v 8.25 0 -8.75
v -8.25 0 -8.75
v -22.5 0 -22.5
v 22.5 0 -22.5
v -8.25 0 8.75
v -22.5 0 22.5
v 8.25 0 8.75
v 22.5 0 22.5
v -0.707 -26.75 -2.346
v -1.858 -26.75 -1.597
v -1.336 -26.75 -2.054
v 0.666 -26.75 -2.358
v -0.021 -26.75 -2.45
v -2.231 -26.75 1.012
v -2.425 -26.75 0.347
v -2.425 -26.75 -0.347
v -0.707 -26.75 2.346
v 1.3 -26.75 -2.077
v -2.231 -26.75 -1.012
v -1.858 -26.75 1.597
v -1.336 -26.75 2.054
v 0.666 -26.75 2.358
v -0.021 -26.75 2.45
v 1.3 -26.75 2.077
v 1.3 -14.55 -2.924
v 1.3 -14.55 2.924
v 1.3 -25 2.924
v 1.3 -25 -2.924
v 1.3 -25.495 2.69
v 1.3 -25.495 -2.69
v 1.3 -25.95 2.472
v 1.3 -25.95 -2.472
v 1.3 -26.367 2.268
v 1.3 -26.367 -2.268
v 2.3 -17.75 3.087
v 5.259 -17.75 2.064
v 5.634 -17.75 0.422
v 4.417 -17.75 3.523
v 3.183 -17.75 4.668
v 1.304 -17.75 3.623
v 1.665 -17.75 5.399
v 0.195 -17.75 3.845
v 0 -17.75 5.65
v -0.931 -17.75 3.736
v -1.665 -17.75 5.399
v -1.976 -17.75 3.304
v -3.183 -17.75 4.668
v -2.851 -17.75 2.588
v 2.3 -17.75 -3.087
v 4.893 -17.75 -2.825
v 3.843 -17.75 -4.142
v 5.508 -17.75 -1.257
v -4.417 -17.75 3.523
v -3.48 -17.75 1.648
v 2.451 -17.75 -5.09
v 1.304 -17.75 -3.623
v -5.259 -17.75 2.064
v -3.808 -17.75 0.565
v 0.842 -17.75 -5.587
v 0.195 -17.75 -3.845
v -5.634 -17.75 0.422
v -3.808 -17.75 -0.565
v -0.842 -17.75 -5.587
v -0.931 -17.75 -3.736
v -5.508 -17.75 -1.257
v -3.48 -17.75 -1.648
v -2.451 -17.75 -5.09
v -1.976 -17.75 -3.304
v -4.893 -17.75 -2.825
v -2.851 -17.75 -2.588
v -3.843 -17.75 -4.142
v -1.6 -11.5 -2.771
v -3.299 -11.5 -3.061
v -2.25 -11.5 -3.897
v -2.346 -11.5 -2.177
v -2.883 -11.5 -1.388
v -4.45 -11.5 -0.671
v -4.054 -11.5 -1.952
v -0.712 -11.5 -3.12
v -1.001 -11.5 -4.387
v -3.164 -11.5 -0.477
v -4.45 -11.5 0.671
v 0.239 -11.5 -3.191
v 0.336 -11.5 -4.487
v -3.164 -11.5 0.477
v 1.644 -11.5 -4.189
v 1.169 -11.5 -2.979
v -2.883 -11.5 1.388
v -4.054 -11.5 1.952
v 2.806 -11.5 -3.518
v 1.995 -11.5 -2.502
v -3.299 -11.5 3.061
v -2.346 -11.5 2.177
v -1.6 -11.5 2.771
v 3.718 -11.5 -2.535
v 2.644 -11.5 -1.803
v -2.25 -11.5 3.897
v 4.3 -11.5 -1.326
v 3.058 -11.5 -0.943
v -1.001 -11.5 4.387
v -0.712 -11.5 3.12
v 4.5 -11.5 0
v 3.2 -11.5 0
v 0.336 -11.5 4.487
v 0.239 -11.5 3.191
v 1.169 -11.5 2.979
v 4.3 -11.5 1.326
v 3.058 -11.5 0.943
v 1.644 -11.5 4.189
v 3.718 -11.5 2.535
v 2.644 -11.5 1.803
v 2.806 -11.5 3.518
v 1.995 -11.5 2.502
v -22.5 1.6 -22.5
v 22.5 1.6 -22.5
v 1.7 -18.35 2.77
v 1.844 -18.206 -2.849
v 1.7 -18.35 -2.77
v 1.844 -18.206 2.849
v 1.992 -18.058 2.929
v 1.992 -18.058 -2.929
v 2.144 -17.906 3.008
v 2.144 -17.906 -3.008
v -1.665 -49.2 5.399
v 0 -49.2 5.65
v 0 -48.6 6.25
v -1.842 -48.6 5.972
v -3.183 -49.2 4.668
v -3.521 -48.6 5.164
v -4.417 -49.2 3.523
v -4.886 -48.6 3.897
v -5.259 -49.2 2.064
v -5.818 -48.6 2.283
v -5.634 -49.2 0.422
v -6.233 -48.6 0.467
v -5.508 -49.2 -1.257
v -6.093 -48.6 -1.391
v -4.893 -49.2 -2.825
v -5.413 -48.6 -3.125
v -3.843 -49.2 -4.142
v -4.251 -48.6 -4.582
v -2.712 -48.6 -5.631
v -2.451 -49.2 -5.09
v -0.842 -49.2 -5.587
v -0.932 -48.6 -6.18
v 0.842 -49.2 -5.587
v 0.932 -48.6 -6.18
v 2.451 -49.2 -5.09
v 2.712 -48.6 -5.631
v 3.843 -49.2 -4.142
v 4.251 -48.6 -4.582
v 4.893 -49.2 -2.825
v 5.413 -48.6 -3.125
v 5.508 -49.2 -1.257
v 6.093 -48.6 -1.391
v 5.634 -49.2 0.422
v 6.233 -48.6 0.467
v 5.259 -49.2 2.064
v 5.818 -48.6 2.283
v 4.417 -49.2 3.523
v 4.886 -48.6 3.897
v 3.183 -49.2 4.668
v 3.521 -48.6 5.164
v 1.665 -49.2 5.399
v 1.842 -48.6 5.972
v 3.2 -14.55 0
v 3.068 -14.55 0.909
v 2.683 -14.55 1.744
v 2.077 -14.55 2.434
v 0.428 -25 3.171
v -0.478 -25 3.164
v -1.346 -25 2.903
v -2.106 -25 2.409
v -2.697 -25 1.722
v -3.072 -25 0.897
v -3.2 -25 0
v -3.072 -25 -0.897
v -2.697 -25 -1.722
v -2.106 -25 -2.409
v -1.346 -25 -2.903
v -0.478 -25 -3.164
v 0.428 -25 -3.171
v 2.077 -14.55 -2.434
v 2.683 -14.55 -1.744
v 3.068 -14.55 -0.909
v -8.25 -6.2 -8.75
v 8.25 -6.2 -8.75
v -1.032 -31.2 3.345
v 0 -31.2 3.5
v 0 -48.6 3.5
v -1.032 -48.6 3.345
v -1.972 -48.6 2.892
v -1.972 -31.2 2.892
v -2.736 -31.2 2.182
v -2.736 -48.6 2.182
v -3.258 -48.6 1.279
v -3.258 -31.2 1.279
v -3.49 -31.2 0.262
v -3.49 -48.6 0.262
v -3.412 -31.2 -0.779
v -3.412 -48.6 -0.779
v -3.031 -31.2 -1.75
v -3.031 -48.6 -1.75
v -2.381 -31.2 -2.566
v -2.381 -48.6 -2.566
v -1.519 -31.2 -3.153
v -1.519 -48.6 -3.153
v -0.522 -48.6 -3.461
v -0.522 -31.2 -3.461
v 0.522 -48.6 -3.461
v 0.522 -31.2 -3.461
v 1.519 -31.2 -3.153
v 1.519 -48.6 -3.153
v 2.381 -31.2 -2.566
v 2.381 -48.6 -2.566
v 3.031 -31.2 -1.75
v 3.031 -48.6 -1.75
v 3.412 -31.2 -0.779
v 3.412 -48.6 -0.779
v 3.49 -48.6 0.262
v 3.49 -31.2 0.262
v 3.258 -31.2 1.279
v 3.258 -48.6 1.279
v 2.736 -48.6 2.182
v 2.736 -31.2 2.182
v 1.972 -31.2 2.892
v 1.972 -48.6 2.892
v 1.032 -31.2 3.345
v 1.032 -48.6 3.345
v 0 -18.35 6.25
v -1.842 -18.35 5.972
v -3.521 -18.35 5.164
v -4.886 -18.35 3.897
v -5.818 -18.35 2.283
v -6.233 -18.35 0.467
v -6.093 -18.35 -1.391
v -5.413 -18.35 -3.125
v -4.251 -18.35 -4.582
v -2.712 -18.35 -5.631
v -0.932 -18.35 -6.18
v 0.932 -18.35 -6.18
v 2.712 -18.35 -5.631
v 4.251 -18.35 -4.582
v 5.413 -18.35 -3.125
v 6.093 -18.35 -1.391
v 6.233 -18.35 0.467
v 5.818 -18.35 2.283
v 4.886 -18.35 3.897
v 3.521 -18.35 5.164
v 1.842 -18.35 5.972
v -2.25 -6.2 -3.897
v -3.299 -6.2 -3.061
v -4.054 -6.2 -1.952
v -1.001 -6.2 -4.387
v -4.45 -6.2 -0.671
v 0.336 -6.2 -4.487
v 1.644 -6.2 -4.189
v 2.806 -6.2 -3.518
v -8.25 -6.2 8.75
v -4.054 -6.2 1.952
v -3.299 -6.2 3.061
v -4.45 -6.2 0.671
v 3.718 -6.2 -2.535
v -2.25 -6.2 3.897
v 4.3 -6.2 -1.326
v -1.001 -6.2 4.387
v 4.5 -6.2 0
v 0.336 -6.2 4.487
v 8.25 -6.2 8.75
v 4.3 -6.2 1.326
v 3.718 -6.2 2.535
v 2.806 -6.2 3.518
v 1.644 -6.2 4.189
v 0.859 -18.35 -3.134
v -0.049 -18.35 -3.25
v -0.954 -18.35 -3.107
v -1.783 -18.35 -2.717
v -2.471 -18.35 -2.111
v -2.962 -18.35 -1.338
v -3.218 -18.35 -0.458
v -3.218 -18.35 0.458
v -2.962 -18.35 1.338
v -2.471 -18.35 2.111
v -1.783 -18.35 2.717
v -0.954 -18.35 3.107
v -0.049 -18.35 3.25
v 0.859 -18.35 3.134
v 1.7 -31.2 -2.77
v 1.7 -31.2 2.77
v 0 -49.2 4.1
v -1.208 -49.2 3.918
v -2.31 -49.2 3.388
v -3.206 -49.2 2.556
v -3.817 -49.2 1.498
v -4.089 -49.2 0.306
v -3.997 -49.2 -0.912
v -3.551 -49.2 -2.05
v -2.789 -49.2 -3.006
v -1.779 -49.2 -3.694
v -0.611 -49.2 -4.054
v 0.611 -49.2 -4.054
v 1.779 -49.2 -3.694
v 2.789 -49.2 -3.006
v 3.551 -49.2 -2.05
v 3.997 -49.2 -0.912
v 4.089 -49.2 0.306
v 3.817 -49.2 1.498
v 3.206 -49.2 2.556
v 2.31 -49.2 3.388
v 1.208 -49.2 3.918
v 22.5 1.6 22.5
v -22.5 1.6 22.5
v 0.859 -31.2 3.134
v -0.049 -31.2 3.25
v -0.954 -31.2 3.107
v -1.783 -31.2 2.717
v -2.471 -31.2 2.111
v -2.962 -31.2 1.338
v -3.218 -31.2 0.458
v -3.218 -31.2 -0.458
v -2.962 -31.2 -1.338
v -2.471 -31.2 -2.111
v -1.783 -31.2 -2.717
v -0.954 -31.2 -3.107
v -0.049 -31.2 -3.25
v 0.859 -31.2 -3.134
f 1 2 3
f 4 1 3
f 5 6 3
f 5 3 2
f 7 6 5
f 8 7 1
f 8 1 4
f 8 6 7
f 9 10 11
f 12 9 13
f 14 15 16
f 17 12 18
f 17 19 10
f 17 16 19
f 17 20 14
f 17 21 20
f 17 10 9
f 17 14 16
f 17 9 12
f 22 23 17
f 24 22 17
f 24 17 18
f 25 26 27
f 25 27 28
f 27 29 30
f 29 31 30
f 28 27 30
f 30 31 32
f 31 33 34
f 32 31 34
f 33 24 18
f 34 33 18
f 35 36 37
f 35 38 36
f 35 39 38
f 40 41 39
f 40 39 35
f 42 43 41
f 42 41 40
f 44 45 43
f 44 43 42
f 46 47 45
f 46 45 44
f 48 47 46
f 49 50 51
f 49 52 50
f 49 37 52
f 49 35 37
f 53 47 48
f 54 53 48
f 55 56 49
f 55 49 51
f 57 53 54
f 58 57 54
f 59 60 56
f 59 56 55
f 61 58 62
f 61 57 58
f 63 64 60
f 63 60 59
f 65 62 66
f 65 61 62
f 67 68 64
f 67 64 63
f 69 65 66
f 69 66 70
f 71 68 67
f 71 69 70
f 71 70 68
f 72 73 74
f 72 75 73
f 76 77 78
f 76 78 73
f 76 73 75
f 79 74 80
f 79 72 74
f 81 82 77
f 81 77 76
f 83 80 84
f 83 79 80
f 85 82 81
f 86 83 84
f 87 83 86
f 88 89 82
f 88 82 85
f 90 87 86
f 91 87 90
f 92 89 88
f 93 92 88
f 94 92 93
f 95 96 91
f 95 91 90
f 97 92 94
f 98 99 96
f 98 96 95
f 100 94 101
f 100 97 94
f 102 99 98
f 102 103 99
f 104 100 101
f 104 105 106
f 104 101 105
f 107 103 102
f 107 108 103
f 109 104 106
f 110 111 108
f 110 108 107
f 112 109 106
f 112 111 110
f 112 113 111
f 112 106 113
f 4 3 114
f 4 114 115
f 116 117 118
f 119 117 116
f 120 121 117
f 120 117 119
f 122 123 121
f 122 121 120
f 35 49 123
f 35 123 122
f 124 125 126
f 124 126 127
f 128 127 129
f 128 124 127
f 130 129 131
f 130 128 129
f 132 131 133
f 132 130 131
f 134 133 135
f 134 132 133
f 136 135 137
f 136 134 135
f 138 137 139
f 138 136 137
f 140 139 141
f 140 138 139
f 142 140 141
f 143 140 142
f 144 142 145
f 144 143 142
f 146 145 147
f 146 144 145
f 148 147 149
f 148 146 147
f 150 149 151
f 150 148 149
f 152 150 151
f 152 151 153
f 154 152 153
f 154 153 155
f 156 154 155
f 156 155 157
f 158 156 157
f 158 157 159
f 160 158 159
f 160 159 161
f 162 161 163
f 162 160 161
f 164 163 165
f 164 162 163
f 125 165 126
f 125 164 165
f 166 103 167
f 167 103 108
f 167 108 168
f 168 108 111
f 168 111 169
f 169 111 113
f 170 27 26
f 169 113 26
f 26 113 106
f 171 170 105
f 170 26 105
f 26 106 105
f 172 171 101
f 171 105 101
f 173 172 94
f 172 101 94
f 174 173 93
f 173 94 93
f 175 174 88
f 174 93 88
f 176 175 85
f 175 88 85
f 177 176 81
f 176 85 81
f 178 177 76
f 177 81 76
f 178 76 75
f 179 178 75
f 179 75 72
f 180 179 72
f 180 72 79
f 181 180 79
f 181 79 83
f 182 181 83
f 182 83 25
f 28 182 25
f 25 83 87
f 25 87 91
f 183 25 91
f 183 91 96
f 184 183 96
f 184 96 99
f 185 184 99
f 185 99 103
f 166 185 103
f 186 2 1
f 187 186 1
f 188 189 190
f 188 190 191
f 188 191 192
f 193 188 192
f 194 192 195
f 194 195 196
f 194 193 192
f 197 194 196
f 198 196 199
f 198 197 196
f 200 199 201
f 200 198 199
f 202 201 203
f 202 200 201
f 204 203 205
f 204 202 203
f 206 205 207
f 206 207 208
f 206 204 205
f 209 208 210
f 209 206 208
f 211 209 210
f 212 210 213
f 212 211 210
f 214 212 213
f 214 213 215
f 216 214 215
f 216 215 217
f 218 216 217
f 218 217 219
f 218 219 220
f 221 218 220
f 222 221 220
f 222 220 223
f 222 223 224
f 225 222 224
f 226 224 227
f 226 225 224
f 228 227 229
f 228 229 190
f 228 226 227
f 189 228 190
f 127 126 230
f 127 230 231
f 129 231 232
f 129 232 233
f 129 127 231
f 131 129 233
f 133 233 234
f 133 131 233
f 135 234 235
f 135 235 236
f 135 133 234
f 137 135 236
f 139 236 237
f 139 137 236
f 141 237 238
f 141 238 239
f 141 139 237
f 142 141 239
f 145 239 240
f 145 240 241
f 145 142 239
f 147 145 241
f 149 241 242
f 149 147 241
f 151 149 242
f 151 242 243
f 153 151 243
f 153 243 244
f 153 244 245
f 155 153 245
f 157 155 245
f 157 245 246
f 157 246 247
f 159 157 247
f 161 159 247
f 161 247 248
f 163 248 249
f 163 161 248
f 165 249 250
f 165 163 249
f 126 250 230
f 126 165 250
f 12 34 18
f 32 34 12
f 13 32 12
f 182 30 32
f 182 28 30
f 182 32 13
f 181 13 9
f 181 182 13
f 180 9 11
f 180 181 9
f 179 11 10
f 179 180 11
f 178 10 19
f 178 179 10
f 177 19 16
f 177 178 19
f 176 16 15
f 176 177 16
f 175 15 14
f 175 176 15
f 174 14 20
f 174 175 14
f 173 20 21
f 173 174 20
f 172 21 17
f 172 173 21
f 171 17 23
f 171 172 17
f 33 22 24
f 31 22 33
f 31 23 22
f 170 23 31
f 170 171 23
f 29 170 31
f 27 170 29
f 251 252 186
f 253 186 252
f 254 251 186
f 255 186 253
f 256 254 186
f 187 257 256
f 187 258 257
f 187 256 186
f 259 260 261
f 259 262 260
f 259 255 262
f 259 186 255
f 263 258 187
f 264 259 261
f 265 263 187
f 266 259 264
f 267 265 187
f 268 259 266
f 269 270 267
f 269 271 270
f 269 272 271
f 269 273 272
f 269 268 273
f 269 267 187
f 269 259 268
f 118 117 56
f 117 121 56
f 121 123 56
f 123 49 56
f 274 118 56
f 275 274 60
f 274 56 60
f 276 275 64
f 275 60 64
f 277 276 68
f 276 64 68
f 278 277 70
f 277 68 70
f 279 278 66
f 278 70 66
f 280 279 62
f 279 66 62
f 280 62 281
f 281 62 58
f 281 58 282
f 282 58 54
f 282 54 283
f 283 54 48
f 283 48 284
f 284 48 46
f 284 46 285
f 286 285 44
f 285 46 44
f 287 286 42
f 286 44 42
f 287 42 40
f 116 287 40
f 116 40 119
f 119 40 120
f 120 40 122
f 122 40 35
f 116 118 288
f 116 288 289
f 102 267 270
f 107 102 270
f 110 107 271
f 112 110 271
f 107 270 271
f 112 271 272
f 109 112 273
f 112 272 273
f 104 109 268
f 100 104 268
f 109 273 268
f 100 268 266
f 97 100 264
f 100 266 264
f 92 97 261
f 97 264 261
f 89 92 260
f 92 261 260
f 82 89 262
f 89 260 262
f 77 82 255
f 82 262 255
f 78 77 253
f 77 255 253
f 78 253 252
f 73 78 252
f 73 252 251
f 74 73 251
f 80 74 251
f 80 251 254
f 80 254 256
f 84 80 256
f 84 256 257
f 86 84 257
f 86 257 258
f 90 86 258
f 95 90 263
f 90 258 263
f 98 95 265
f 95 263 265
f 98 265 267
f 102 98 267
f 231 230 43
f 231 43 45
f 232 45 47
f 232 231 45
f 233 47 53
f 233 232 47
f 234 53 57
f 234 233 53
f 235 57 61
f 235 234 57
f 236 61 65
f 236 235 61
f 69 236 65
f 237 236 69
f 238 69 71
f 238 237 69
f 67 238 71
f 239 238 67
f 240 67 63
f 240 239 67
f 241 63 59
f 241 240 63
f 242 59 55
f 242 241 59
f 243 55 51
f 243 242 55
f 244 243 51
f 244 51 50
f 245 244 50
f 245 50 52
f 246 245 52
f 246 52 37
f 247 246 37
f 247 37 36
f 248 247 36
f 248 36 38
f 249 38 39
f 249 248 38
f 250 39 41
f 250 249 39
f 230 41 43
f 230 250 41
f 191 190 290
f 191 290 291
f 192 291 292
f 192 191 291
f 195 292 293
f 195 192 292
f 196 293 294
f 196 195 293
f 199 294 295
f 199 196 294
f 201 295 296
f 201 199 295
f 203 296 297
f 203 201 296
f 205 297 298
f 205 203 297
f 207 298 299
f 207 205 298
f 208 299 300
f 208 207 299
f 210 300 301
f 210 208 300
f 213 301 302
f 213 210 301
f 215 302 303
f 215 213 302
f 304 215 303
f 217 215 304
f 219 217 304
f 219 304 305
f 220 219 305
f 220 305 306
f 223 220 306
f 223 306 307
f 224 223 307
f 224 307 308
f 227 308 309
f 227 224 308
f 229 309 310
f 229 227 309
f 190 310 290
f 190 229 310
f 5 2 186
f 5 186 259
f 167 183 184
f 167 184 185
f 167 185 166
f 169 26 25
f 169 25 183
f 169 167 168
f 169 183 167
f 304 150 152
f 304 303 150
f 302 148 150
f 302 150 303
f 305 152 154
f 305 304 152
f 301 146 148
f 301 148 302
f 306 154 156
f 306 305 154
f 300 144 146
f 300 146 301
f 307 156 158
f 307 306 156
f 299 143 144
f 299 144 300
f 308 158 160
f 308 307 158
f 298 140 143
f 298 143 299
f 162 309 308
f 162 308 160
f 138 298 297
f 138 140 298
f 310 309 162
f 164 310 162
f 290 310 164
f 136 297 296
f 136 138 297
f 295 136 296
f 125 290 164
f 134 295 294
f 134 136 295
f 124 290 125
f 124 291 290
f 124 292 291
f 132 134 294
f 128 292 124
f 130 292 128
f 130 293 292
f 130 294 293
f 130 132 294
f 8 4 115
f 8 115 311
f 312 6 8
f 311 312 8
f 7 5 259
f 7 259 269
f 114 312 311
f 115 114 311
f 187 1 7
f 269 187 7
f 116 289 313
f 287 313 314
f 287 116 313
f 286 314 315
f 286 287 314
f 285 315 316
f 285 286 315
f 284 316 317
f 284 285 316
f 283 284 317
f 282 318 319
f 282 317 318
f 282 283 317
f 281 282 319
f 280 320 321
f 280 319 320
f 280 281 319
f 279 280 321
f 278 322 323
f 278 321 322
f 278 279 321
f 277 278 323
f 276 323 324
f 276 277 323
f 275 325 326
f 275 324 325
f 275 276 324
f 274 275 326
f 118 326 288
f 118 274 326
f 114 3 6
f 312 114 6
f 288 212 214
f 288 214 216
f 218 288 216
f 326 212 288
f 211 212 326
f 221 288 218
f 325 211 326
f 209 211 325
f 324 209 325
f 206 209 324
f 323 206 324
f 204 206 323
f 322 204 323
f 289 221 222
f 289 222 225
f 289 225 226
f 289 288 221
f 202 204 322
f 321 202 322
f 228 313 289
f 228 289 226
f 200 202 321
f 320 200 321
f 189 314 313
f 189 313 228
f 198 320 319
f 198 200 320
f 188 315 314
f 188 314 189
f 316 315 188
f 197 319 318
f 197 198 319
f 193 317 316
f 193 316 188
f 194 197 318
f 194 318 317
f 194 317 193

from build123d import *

# Parameters (mm, degrees)
F0_W      = 45
F0_H      = 45
F1_DEPTH  = 1.6
F2_W      = 16.5
F2_H      = 17.5
F3_DEPTH  = 6.2
F4_R      = 4.5
F5_DEPTH  = 5.3
F6_R      = 3.2
F7_DEPTH  = 15.25
F9_DEPTH  = 12.2
F17_DEPTH = 11
F18_SIZE  = 0.6
F19_DEPTH = 25


with BuildPart() as f1:
    # F0 (on Front) → F1 (new body)
    with BuildSketch(Plane.XZ):
        Rectangle(F0_W, F0_H)
    extrude(amount=-F1_DEPTH)

    # F2 (on face) → F3 (join)
    with BuildSketch(Plane.XZ):
        Rectangle(F2_W, F2_H)
    extrude(amount=F3_DEPTH)

    # F4 (on face) → F5 (join)
    with BuildSketch(Plane.XZ.offset(6.2)):
        Circle(F4_R)
    extrude(amount=F5_DEPTH)

    # F6 (on face) → F7 (join)
    with BuildSketch(Plane.XZ.offset(11.5)):
        Circle(F6_R)
    extrude(amount=F7_DEPTH)

    # F8 (on face) → F9 (cut)
    with BuildSketch(Plane.XZ.offset(26.75)):
        with BuildLine():
            Line((1.3, 2.9240383034), (1.3, -2.9240383034))
            ThreePointArc((1.3, -2.9240383034), (3.2, 0), (1.3, 2.9240383034))
        make_face()
    extrude(amount=-F9_DEPTH, mode=Mode.SUBTRACT)

    # F10 (on Top) → F11 (revolve, cut)
    with BuildSketch(Plane.XY):
        Polygon((-2.45, -26.75), (-3.2, -25), (-3.2, -26.75), align=None)
    revolve(axis=Axis((0, -13.375, 0), (0, 1, 0)), mode=Mode.SUBTRACT)


with BuildPart() as f15:
    # F14 (on Right) → F15 (revolve)
    with BuildSketch(Plane.YZ):
        Polygon((-28.75, 3.25), (-17.75, 3.25), (-17.75, 6.25), (-49.2, 6.25), (-49.2, 3.5), (-31.2, 3.5), (-31.2, 0), (-28.75, 0), align=None)
    revolve(axis=Axis((0, -29.975, 0), (0, -1, 0)))

    # F16 (on face) → F17 (join, through all)
    with BuildSketch(Plane(origin=(0, -17.75, 0), x_dir=(-1, 0, 0), z_dir=(0, 1, 0))):
        with BuildLine():
            Line((-1.7, -2.7699277969), (-1.7, 2.7699277969))
            ThreePointArc((-1.7, 2.7699277969), (-3.25, 0), (-1.7, -2.7699277969))
        make_face()
    extrude(amount=-F17_DEPTH)

    # F18
    f18_edges = [f15.edges().sort_by_distance(p)[0] for p in [
        (0, -17.75, -6.25),
        (0, -49.2, -6.25),
        (0, -49.2, -3.5),
        (-3.25, -17.75, 0),
        (1.7, -17.75, 0),
    ]]
    chamfer(f18_edges, length=F18_SIZE)

    # F19 (cut): a face of the model
    f19_faces = [f15.faces().sort_by_distance(p)[0] for p in [
        (-0.5225292511, -28.75, 0),
    ]]
    extrude(f19_faces, amount=-F19_DEPTH, mode=Mode.SUBTRACT)


solid = Compound([f1.part, f15.part])
